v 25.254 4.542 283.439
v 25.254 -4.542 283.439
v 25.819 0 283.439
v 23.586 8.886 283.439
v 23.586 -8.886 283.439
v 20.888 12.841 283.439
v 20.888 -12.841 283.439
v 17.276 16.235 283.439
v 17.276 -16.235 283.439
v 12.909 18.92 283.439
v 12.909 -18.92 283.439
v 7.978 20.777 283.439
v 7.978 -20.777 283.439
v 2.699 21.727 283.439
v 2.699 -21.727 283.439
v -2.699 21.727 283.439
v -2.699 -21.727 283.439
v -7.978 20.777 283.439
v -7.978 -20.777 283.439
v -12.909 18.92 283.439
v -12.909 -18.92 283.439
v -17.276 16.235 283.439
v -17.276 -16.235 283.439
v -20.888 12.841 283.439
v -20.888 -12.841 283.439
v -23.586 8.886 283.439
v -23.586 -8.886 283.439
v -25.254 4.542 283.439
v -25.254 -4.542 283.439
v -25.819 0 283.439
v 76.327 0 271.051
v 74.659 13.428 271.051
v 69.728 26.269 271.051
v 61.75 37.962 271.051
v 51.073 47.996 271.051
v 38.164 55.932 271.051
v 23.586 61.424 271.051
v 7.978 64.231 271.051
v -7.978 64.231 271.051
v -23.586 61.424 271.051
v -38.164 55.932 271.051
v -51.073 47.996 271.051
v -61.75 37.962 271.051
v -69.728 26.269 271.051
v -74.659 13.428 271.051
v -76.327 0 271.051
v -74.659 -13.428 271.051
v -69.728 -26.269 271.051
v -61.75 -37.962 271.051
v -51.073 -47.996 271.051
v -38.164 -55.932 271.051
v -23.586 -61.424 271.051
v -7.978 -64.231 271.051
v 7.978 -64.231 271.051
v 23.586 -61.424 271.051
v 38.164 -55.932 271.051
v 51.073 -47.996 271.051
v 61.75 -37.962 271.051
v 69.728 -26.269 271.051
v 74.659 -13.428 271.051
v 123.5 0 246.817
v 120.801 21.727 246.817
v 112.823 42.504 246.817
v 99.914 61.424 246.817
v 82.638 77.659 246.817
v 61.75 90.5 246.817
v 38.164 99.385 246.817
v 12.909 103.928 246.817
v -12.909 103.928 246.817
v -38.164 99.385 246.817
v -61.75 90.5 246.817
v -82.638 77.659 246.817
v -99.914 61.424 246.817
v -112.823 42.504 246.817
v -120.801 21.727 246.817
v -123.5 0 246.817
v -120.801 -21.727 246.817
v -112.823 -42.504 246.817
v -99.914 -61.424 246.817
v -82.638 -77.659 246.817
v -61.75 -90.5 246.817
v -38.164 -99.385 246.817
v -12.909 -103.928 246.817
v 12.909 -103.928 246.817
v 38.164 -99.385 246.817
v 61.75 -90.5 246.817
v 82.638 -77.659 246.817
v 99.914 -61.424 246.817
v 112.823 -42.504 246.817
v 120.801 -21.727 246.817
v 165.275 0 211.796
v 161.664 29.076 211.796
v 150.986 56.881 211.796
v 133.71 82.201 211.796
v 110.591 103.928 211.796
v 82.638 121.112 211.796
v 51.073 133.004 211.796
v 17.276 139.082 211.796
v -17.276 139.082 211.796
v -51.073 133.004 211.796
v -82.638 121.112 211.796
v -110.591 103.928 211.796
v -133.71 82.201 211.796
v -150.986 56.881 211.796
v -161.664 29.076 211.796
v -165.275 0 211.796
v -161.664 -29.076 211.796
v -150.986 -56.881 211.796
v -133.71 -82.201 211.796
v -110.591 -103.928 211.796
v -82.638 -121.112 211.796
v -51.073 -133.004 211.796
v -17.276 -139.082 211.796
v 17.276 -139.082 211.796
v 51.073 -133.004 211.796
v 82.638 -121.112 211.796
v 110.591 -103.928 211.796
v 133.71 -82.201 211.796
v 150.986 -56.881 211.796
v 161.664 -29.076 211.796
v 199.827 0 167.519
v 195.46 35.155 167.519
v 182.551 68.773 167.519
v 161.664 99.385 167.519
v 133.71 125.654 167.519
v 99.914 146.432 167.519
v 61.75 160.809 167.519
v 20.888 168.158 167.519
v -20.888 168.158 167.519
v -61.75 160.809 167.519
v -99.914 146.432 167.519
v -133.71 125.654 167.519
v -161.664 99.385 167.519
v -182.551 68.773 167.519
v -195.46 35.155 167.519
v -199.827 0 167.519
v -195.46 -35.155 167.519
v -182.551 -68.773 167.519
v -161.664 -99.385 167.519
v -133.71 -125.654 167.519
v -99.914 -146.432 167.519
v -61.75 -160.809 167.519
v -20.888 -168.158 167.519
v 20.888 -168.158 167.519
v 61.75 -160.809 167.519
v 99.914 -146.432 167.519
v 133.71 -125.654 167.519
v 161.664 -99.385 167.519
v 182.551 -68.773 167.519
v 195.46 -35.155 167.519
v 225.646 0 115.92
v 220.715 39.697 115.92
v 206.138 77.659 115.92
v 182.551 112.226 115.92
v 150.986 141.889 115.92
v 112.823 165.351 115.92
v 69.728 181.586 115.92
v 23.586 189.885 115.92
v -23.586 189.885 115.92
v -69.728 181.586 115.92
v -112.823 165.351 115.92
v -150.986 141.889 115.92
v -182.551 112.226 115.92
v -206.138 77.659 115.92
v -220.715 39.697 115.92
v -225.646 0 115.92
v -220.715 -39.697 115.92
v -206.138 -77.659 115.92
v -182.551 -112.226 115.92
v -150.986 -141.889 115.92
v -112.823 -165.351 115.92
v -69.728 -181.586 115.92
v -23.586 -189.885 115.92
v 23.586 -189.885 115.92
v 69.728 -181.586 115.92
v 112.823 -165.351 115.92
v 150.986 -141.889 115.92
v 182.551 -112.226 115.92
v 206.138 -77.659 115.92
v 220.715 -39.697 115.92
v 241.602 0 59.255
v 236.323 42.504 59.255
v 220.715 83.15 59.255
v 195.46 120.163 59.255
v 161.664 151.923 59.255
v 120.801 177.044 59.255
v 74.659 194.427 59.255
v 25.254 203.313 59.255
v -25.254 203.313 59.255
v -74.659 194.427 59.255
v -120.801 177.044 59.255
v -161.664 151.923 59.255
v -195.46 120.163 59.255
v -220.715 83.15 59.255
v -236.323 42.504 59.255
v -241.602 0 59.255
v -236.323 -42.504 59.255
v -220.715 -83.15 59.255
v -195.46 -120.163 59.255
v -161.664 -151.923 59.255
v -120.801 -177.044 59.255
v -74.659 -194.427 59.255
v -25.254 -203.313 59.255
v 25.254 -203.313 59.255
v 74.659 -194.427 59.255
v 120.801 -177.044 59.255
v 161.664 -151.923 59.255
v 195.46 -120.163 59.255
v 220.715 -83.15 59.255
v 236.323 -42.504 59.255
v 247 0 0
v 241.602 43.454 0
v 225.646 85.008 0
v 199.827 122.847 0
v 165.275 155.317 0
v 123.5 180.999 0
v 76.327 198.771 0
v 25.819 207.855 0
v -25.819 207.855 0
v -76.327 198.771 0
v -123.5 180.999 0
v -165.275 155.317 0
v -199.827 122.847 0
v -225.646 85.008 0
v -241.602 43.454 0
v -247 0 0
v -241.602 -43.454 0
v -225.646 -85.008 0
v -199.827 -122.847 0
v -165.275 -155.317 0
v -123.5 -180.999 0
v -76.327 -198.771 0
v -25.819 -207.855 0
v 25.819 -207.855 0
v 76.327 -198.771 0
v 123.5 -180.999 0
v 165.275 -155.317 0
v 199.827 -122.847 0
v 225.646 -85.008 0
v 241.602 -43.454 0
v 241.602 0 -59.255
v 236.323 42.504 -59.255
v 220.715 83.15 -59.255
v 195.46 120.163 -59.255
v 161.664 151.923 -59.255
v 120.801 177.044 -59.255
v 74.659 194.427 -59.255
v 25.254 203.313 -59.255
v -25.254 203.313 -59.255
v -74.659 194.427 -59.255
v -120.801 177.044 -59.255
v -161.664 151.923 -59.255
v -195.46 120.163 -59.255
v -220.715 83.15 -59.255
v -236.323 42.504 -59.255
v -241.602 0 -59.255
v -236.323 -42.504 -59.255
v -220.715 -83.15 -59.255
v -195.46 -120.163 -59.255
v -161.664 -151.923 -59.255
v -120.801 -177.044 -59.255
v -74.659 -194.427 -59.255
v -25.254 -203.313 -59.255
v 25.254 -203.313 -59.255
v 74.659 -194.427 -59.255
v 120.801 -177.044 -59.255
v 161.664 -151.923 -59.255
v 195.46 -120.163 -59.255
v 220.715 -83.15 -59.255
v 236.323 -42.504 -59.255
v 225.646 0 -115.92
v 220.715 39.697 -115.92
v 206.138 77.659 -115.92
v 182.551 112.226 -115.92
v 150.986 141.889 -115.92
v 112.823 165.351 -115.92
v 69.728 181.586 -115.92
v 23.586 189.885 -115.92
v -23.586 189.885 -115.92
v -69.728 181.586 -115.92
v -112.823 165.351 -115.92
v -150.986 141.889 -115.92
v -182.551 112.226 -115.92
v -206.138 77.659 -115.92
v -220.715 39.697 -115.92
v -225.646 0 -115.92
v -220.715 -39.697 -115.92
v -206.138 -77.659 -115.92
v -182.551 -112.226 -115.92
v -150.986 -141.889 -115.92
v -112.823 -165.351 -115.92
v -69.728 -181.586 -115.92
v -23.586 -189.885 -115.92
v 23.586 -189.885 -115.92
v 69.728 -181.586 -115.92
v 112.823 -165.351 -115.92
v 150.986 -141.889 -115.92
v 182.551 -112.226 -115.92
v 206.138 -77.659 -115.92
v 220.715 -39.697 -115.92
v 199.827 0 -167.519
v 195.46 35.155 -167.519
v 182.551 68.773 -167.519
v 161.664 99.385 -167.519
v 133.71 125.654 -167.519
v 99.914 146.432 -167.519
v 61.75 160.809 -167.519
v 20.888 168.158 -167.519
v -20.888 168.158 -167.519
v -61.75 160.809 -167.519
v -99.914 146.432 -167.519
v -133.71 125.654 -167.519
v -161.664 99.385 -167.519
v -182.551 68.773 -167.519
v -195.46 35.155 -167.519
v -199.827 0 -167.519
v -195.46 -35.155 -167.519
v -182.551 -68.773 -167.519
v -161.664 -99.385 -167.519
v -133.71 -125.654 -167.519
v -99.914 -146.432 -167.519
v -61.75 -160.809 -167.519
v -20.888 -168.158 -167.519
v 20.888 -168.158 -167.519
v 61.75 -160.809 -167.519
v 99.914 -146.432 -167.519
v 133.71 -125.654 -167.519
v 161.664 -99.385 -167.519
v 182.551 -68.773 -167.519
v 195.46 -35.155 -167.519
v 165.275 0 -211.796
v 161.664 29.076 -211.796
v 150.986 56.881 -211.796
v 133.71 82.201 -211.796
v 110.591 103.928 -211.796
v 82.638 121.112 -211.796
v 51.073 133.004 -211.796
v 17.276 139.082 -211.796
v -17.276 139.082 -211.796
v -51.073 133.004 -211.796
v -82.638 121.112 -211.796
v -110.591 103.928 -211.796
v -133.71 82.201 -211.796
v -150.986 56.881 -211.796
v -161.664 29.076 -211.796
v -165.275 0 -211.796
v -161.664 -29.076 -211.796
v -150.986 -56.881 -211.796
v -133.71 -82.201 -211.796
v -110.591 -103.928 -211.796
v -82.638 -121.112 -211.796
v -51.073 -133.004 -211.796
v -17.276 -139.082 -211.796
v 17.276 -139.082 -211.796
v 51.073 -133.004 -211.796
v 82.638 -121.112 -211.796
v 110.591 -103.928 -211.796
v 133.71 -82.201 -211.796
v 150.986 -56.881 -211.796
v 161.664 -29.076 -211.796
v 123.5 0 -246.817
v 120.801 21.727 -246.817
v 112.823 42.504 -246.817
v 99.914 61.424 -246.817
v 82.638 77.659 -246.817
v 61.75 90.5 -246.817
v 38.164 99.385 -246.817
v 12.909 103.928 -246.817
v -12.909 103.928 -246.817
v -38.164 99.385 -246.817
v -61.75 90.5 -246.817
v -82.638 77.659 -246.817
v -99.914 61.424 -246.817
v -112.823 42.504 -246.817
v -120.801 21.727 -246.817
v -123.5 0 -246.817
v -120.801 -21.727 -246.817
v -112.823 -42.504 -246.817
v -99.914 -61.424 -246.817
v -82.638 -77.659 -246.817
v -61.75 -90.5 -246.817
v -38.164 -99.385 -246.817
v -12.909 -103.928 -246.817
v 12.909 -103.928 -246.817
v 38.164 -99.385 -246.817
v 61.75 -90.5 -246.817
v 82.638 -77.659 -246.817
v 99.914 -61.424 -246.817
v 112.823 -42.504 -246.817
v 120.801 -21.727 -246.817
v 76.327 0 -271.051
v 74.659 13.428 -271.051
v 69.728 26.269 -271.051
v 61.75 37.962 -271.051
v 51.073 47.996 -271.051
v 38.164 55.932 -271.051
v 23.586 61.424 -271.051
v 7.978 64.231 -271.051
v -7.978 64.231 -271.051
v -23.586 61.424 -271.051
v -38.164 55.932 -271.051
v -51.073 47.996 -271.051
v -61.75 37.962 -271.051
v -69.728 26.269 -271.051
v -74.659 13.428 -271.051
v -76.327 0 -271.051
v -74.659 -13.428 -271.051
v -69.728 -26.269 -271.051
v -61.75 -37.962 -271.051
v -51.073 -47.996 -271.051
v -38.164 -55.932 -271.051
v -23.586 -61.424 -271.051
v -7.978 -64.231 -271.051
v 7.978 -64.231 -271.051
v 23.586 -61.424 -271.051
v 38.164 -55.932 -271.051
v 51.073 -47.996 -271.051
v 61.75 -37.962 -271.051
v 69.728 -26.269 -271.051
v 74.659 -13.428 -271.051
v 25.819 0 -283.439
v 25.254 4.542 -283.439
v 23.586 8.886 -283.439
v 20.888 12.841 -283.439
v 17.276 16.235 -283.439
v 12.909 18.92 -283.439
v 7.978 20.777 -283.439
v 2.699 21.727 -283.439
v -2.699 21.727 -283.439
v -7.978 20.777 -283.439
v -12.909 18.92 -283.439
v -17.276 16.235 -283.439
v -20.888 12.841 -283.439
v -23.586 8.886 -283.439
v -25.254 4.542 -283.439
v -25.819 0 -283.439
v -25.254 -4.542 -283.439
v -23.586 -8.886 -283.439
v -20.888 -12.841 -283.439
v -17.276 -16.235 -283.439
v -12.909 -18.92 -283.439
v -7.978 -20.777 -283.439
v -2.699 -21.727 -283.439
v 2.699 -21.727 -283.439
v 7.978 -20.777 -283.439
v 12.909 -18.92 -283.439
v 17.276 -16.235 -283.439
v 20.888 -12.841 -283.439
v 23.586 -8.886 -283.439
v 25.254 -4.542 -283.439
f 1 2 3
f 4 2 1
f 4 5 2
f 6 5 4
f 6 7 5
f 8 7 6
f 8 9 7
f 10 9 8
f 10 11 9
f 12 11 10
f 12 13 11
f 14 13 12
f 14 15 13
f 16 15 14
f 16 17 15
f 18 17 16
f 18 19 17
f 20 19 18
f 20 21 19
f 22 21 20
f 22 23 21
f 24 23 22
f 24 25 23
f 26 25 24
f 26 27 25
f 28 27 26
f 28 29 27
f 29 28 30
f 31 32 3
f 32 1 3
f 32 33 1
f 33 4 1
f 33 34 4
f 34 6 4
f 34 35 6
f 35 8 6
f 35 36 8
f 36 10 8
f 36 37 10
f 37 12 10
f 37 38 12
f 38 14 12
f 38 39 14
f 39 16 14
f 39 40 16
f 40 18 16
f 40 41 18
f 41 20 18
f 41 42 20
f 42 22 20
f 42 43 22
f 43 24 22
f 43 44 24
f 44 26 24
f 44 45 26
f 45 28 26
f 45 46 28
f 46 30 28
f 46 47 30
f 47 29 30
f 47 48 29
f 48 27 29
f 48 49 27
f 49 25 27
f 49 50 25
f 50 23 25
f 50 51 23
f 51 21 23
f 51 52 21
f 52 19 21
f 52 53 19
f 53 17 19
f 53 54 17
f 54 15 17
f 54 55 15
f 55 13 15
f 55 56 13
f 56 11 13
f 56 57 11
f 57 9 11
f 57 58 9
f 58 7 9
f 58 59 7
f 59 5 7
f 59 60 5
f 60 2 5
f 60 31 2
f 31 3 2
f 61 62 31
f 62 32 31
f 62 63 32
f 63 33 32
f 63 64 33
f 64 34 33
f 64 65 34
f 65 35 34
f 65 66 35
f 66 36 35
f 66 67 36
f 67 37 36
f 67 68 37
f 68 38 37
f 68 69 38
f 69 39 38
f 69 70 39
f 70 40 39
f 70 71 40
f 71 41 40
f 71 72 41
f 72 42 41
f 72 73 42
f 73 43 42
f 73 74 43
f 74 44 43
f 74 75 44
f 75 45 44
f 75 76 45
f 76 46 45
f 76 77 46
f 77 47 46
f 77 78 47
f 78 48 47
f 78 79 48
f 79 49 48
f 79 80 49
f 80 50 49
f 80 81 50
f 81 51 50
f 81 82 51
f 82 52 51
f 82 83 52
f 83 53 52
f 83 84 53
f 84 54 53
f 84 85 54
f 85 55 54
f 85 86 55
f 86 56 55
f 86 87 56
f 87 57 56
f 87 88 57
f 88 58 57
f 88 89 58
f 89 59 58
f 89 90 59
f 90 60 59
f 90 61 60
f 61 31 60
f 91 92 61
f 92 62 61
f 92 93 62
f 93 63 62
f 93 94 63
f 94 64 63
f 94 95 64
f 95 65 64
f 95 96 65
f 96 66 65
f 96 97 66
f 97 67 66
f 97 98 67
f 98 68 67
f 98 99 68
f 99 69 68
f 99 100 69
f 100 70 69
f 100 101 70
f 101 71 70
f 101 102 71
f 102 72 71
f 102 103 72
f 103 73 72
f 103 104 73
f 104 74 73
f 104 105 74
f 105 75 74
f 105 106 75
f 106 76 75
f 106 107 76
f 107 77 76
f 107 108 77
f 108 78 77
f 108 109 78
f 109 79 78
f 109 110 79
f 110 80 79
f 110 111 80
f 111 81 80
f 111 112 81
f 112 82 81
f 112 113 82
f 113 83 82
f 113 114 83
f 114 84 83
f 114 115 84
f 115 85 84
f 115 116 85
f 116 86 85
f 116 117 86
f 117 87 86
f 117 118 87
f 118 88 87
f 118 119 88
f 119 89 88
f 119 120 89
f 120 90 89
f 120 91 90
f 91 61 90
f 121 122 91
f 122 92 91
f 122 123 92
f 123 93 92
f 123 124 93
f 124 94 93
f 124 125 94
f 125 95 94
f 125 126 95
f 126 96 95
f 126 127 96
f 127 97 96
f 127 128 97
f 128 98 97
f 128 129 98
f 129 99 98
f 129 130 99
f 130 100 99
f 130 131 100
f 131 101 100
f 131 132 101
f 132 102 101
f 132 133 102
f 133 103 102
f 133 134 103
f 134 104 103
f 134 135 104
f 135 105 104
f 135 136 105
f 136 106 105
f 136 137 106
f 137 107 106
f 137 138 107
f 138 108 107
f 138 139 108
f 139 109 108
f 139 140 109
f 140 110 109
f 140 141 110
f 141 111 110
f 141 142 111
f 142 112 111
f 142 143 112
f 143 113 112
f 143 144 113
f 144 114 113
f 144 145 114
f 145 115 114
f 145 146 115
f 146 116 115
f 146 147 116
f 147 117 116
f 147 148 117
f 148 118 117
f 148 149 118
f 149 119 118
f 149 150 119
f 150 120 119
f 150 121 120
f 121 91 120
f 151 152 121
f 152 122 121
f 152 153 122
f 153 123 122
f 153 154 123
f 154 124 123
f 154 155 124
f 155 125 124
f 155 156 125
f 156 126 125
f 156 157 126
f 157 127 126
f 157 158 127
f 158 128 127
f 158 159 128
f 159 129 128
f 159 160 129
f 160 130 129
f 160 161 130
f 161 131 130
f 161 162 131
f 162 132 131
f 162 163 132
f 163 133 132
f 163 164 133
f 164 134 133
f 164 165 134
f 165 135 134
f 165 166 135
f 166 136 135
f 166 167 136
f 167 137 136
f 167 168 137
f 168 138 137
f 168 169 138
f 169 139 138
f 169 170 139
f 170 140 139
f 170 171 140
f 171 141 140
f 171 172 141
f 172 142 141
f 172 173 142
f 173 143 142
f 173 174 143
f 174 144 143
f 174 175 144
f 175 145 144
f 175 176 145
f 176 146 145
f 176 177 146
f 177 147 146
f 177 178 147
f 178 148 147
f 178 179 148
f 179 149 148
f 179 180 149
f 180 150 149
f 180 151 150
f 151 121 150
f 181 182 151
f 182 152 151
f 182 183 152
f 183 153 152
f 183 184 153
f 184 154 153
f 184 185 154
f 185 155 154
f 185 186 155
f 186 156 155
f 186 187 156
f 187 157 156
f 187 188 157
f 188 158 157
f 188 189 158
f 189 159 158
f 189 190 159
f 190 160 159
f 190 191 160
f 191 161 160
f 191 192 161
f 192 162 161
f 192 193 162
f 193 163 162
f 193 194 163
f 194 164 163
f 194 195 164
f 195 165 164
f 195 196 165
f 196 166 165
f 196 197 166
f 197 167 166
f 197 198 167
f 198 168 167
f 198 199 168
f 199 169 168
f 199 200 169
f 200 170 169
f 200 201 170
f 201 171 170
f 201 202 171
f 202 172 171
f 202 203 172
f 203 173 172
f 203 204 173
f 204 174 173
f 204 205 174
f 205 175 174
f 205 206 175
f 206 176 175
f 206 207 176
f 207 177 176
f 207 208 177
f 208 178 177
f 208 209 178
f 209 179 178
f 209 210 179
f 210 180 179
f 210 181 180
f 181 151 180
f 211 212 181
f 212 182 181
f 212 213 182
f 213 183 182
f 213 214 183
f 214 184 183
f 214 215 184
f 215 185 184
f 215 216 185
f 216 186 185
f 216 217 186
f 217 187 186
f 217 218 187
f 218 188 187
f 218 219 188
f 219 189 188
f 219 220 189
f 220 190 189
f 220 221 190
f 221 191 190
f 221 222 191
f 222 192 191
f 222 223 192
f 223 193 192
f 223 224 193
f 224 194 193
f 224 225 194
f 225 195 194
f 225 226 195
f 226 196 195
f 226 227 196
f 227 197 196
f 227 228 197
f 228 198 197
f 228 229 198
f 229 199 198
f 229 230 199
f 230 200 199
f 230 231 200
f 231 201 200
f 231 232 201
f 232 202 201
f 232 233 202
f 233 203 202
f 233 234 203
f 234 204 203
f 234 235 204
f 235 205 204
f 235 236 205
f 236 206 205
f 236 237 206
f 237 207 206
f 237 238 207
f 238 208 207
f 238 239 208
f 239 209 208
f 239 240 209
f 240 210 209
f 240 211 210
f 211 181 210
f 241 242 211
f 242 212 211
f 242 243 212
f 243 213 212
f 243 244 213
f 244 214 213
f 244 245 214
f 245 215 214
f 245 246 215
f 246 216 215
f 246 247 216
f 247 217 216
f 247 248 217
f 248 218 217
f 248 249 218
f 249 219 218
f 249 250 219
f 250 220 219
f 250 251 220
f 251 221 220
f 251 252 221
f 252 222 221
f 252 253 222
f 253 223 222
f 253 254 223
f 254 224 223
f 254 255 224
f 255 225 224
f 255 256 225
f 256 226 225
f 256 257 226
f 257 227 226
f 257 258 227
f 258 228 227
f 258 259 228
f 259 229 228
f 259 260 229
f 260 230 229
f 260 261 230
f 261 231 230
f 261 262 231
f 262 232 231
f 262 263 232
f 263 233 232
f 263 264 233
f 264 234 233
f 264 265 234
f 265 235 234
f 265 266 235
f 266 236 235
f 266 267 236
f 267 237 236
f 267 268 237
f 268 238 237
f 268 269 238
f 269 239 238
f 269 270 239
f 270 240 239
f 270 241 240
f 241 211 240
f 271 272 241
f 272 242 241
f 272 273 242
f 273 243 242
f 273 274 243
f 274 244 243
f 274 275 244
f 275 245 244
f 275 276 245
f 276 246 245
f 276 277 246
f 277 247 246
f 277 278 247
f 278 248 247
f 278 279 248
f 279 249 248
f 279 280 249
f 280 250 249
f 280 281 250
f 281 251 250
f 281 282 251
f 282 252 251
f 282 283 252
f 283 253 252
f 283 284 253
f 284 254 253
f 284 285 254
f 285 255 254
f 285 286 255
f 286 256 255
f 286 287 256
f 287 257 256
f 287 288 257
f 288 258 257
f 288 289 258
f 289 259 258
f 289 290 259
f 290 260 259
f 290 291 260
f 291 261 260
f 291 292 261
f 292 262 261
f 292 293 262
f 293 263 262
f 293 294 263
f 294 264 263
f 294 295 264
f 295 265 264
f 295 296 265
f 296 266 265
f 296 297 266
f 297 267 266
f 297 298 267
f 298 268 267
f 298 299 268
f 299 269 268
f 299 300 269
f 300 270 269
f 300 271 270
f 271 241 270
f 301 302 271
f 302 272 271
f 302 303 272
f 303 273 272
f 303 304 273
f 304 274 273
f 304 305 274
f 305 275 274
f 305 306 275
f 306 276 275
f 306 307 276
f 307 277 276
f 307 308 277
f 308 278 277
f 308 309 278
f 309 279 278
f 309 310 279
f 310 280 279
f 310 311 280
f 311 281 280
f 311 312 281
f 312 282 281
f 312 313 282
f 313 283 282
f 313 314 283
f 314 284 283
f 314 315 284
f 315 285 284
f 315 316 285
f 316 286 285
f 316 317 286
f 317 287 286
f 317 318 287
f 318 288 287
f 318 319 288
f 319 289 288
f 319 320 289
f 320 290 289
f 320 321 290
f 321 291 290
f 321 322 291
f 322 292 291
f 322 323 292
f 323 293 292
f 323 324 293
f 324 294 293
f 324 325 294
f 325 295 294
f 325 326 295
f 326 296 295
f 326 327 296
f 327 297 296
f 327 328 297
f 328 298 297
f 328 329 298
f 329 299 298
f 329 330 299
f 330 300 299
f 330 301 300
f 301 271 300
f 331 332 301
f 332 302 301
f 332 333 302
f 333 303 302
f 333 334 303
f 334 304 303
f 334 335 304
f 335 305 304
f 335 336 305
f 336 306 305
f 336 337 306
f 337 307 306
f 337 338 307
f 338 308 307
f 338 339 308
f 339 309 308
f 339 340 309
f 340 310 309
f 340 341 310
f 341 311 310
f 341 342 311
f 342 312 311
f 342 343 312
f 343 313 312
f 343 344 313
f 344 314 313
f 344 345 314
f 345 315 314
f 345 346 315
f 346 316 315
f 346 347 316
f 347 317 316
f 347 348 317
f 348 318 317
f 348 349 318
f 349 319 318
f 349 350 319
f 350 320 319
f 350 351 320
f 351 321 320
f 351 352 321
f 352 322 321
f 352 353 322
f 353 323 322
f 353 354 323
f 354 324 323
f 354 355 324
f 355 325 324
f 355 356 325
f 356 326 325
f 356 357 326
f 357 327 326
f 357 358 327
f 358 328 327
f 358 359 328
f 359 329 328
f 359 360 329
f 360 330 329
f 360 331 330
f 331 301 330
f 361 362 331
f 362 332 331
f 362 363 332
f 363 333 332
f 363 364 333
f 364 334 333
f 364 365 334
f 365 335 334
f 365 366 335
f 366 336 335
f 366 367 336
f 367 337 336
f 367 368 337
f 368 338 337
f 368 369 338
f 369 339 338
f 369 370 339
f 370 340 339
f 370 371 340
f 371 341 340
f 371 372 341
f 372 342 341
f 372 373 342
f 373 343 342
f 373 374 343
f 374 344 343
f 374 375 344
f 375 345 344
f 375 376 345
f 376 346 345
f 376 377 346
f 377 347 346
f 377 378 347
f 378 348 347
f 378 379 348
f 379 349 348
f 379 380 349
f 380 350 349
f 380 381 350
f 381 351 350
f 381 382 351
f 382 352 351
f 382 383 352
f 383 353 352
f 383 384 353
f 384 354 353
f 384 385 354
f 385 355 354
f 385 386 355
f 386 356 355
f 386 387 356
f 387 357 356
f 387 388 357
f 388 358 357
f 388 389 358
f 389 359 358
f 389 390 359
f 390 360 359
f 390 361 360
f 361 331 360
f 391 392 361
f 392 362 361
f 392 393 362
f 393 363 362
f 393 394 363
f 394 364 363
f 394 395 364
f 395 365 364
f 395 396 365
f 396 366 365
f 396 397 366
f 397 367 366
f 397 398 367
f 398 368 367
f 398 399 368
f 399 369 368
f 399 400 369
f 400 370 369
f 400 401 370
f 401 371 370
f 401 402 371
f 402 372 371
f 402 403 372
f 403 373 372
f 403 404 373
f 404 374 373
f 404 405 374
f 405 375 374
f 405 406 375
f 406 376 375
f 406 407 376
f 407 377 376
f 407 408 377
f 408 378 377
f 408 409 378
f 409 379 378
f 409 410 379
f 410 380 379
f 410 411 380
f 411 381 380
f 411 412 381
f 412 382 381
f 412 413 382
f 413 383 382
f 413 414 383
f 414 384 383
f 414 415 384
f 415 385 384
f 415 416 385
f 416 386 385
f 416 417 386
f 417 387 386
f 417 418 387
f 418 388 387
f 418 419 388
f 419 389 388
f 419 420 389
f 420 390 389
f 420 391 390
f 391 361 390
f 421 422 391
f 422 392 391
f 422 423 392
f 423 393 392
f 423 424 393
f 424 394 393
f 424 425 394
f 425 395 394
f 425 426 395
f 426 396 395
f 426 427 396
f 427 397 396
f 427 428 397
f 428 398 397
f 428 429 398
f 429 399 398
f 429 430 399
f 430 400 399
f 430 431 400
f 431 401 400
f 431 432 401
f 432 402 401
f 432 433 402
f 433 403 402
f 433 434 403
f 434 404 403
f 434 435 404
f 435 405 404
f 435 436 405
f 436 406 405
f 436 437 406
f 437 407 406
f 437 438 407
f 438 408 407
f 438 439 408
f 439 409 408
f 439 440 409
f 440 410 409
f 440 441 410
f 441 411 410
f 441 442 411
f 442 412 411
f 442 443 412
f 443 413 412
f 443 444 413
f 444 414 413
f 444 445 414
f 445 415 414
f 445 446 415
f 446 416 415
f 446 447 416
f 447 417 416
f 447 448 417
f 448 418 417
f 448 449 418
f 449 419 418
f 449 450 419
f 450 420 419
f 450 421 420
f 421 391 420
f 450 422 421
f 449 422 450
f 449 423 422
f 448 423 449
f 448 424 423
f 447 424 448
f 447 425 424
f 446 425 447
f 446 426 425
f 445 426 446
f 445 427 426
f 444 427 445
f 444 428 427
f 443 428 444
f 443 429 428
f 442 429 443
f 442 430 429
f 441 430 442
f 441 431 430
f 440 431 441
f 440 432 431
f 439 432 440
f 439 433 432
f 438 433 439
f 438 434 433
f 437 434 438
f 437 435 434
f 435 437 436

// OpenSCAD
// Generated by SolidPython 1.0.1 on 2020-07-29 00:46:51


scale(v = [13, 11, 15]) {
	sphere(r = 19);
}
/***********************************************
*********      SolidPython code:      **********
************************************************
 
# import packages: SolidPython
from solid import *
from solid.utils import *
from itertools import chain, combinations, permutations


class Resize:

    def __init__(self, scad_file):
        self.scad_file = scad_file
        #self.scad_file = import_scad(scad_file)
        # cone/cylinder param:
        self.r1 = 0
        self.r2 = 0
        self.h = 0
        # rectangular prism param:
        self.w = 0
        self.l = 0
        # ellipse param:
        self.r = 0

    # import OpenScad code (file name corresponds to shape)


    # classify shape + parameters
    def assign(self, param1, param2, param3):
        if self.scad_file == 'cone.scad':
            self.r1 = param1
            self.r2 = param2
            self.h = param3
        elif self.scad_file == 'cylinder.scad':
            self.r1 = param1
            self.r2 = param2
            self.h = param3
        elif self.scad_file == 'rectangularPrism.scad':
            self.h = param1
            self.l = param2
            self.w = param3
        else:
            self.r = param1
            self.h = param2

    # resize parameters
    def iterate(self):
        x = range(3, 20, 2)
        i = 1
        if self.scad_file == 'cone.scad':
            tempList = list(permutations(x, 2))
            for temp in tempList:
                param1 = temp[0]
                param2 = temp[1]
                filepath = 'produced_scad_files/' + 'cone' + str(param1) + '_' + str(param2) + '_' + '.scad'
                scad_render_to_file(cylinder(h=param1, r1=param2, r2=0), filepath)

        elif self.scad_file == 'cylinder.scad':
            tempList = list(permutations(x, 3))
            for temp in tempList:
                param1 = temp[0]
                param2 = temp[1]
                filepath = 'produced_scad_files/' + 'cylinder' + str(param1) + '_' + str(param2) + '_' + '.scad'
                scad_render_to_file(cylinder(h=param1, r1=param2, r2=param2), filepath)

        elif self.scad_file == 'rectangularPrism.scad':
            tempList = list(permutations(x, 3))
            for temp in tempList:
                param1 = temp[0]
                param2 = temp[1]
                param3 = temp[2]
                filepath = 'produced_scad_files/' + 'rectangularPrism' + str(param1) + '_' + str(param2) + '_' + str(
                    param3) + '.scad'
                scad_render_to_file(cube(size=(param1, param2, param3)), filepath)

        elif self.scad_file == 'ellipse.scad':
            tempList = list(permutations(x, 4))
            for temp in tempList:
                param1 = temp[0]
                param2 = temp[1]
                param3 = temp[2]
                param4 = temp[3]
                filepath = 'produced_scad_files/' + 'ellipse' + str(param1) + '_' + str(param2) + '_' + str(param3) + '_' + str(param4) + '.scad'
                scad_render_to_file(scale([param1, param2, param3])(sphere(r=param4)), filepath)

    def render_to_scadfile(self):
        scad_render_to_file(scad, 'example.scad') 
 
************************************************/
